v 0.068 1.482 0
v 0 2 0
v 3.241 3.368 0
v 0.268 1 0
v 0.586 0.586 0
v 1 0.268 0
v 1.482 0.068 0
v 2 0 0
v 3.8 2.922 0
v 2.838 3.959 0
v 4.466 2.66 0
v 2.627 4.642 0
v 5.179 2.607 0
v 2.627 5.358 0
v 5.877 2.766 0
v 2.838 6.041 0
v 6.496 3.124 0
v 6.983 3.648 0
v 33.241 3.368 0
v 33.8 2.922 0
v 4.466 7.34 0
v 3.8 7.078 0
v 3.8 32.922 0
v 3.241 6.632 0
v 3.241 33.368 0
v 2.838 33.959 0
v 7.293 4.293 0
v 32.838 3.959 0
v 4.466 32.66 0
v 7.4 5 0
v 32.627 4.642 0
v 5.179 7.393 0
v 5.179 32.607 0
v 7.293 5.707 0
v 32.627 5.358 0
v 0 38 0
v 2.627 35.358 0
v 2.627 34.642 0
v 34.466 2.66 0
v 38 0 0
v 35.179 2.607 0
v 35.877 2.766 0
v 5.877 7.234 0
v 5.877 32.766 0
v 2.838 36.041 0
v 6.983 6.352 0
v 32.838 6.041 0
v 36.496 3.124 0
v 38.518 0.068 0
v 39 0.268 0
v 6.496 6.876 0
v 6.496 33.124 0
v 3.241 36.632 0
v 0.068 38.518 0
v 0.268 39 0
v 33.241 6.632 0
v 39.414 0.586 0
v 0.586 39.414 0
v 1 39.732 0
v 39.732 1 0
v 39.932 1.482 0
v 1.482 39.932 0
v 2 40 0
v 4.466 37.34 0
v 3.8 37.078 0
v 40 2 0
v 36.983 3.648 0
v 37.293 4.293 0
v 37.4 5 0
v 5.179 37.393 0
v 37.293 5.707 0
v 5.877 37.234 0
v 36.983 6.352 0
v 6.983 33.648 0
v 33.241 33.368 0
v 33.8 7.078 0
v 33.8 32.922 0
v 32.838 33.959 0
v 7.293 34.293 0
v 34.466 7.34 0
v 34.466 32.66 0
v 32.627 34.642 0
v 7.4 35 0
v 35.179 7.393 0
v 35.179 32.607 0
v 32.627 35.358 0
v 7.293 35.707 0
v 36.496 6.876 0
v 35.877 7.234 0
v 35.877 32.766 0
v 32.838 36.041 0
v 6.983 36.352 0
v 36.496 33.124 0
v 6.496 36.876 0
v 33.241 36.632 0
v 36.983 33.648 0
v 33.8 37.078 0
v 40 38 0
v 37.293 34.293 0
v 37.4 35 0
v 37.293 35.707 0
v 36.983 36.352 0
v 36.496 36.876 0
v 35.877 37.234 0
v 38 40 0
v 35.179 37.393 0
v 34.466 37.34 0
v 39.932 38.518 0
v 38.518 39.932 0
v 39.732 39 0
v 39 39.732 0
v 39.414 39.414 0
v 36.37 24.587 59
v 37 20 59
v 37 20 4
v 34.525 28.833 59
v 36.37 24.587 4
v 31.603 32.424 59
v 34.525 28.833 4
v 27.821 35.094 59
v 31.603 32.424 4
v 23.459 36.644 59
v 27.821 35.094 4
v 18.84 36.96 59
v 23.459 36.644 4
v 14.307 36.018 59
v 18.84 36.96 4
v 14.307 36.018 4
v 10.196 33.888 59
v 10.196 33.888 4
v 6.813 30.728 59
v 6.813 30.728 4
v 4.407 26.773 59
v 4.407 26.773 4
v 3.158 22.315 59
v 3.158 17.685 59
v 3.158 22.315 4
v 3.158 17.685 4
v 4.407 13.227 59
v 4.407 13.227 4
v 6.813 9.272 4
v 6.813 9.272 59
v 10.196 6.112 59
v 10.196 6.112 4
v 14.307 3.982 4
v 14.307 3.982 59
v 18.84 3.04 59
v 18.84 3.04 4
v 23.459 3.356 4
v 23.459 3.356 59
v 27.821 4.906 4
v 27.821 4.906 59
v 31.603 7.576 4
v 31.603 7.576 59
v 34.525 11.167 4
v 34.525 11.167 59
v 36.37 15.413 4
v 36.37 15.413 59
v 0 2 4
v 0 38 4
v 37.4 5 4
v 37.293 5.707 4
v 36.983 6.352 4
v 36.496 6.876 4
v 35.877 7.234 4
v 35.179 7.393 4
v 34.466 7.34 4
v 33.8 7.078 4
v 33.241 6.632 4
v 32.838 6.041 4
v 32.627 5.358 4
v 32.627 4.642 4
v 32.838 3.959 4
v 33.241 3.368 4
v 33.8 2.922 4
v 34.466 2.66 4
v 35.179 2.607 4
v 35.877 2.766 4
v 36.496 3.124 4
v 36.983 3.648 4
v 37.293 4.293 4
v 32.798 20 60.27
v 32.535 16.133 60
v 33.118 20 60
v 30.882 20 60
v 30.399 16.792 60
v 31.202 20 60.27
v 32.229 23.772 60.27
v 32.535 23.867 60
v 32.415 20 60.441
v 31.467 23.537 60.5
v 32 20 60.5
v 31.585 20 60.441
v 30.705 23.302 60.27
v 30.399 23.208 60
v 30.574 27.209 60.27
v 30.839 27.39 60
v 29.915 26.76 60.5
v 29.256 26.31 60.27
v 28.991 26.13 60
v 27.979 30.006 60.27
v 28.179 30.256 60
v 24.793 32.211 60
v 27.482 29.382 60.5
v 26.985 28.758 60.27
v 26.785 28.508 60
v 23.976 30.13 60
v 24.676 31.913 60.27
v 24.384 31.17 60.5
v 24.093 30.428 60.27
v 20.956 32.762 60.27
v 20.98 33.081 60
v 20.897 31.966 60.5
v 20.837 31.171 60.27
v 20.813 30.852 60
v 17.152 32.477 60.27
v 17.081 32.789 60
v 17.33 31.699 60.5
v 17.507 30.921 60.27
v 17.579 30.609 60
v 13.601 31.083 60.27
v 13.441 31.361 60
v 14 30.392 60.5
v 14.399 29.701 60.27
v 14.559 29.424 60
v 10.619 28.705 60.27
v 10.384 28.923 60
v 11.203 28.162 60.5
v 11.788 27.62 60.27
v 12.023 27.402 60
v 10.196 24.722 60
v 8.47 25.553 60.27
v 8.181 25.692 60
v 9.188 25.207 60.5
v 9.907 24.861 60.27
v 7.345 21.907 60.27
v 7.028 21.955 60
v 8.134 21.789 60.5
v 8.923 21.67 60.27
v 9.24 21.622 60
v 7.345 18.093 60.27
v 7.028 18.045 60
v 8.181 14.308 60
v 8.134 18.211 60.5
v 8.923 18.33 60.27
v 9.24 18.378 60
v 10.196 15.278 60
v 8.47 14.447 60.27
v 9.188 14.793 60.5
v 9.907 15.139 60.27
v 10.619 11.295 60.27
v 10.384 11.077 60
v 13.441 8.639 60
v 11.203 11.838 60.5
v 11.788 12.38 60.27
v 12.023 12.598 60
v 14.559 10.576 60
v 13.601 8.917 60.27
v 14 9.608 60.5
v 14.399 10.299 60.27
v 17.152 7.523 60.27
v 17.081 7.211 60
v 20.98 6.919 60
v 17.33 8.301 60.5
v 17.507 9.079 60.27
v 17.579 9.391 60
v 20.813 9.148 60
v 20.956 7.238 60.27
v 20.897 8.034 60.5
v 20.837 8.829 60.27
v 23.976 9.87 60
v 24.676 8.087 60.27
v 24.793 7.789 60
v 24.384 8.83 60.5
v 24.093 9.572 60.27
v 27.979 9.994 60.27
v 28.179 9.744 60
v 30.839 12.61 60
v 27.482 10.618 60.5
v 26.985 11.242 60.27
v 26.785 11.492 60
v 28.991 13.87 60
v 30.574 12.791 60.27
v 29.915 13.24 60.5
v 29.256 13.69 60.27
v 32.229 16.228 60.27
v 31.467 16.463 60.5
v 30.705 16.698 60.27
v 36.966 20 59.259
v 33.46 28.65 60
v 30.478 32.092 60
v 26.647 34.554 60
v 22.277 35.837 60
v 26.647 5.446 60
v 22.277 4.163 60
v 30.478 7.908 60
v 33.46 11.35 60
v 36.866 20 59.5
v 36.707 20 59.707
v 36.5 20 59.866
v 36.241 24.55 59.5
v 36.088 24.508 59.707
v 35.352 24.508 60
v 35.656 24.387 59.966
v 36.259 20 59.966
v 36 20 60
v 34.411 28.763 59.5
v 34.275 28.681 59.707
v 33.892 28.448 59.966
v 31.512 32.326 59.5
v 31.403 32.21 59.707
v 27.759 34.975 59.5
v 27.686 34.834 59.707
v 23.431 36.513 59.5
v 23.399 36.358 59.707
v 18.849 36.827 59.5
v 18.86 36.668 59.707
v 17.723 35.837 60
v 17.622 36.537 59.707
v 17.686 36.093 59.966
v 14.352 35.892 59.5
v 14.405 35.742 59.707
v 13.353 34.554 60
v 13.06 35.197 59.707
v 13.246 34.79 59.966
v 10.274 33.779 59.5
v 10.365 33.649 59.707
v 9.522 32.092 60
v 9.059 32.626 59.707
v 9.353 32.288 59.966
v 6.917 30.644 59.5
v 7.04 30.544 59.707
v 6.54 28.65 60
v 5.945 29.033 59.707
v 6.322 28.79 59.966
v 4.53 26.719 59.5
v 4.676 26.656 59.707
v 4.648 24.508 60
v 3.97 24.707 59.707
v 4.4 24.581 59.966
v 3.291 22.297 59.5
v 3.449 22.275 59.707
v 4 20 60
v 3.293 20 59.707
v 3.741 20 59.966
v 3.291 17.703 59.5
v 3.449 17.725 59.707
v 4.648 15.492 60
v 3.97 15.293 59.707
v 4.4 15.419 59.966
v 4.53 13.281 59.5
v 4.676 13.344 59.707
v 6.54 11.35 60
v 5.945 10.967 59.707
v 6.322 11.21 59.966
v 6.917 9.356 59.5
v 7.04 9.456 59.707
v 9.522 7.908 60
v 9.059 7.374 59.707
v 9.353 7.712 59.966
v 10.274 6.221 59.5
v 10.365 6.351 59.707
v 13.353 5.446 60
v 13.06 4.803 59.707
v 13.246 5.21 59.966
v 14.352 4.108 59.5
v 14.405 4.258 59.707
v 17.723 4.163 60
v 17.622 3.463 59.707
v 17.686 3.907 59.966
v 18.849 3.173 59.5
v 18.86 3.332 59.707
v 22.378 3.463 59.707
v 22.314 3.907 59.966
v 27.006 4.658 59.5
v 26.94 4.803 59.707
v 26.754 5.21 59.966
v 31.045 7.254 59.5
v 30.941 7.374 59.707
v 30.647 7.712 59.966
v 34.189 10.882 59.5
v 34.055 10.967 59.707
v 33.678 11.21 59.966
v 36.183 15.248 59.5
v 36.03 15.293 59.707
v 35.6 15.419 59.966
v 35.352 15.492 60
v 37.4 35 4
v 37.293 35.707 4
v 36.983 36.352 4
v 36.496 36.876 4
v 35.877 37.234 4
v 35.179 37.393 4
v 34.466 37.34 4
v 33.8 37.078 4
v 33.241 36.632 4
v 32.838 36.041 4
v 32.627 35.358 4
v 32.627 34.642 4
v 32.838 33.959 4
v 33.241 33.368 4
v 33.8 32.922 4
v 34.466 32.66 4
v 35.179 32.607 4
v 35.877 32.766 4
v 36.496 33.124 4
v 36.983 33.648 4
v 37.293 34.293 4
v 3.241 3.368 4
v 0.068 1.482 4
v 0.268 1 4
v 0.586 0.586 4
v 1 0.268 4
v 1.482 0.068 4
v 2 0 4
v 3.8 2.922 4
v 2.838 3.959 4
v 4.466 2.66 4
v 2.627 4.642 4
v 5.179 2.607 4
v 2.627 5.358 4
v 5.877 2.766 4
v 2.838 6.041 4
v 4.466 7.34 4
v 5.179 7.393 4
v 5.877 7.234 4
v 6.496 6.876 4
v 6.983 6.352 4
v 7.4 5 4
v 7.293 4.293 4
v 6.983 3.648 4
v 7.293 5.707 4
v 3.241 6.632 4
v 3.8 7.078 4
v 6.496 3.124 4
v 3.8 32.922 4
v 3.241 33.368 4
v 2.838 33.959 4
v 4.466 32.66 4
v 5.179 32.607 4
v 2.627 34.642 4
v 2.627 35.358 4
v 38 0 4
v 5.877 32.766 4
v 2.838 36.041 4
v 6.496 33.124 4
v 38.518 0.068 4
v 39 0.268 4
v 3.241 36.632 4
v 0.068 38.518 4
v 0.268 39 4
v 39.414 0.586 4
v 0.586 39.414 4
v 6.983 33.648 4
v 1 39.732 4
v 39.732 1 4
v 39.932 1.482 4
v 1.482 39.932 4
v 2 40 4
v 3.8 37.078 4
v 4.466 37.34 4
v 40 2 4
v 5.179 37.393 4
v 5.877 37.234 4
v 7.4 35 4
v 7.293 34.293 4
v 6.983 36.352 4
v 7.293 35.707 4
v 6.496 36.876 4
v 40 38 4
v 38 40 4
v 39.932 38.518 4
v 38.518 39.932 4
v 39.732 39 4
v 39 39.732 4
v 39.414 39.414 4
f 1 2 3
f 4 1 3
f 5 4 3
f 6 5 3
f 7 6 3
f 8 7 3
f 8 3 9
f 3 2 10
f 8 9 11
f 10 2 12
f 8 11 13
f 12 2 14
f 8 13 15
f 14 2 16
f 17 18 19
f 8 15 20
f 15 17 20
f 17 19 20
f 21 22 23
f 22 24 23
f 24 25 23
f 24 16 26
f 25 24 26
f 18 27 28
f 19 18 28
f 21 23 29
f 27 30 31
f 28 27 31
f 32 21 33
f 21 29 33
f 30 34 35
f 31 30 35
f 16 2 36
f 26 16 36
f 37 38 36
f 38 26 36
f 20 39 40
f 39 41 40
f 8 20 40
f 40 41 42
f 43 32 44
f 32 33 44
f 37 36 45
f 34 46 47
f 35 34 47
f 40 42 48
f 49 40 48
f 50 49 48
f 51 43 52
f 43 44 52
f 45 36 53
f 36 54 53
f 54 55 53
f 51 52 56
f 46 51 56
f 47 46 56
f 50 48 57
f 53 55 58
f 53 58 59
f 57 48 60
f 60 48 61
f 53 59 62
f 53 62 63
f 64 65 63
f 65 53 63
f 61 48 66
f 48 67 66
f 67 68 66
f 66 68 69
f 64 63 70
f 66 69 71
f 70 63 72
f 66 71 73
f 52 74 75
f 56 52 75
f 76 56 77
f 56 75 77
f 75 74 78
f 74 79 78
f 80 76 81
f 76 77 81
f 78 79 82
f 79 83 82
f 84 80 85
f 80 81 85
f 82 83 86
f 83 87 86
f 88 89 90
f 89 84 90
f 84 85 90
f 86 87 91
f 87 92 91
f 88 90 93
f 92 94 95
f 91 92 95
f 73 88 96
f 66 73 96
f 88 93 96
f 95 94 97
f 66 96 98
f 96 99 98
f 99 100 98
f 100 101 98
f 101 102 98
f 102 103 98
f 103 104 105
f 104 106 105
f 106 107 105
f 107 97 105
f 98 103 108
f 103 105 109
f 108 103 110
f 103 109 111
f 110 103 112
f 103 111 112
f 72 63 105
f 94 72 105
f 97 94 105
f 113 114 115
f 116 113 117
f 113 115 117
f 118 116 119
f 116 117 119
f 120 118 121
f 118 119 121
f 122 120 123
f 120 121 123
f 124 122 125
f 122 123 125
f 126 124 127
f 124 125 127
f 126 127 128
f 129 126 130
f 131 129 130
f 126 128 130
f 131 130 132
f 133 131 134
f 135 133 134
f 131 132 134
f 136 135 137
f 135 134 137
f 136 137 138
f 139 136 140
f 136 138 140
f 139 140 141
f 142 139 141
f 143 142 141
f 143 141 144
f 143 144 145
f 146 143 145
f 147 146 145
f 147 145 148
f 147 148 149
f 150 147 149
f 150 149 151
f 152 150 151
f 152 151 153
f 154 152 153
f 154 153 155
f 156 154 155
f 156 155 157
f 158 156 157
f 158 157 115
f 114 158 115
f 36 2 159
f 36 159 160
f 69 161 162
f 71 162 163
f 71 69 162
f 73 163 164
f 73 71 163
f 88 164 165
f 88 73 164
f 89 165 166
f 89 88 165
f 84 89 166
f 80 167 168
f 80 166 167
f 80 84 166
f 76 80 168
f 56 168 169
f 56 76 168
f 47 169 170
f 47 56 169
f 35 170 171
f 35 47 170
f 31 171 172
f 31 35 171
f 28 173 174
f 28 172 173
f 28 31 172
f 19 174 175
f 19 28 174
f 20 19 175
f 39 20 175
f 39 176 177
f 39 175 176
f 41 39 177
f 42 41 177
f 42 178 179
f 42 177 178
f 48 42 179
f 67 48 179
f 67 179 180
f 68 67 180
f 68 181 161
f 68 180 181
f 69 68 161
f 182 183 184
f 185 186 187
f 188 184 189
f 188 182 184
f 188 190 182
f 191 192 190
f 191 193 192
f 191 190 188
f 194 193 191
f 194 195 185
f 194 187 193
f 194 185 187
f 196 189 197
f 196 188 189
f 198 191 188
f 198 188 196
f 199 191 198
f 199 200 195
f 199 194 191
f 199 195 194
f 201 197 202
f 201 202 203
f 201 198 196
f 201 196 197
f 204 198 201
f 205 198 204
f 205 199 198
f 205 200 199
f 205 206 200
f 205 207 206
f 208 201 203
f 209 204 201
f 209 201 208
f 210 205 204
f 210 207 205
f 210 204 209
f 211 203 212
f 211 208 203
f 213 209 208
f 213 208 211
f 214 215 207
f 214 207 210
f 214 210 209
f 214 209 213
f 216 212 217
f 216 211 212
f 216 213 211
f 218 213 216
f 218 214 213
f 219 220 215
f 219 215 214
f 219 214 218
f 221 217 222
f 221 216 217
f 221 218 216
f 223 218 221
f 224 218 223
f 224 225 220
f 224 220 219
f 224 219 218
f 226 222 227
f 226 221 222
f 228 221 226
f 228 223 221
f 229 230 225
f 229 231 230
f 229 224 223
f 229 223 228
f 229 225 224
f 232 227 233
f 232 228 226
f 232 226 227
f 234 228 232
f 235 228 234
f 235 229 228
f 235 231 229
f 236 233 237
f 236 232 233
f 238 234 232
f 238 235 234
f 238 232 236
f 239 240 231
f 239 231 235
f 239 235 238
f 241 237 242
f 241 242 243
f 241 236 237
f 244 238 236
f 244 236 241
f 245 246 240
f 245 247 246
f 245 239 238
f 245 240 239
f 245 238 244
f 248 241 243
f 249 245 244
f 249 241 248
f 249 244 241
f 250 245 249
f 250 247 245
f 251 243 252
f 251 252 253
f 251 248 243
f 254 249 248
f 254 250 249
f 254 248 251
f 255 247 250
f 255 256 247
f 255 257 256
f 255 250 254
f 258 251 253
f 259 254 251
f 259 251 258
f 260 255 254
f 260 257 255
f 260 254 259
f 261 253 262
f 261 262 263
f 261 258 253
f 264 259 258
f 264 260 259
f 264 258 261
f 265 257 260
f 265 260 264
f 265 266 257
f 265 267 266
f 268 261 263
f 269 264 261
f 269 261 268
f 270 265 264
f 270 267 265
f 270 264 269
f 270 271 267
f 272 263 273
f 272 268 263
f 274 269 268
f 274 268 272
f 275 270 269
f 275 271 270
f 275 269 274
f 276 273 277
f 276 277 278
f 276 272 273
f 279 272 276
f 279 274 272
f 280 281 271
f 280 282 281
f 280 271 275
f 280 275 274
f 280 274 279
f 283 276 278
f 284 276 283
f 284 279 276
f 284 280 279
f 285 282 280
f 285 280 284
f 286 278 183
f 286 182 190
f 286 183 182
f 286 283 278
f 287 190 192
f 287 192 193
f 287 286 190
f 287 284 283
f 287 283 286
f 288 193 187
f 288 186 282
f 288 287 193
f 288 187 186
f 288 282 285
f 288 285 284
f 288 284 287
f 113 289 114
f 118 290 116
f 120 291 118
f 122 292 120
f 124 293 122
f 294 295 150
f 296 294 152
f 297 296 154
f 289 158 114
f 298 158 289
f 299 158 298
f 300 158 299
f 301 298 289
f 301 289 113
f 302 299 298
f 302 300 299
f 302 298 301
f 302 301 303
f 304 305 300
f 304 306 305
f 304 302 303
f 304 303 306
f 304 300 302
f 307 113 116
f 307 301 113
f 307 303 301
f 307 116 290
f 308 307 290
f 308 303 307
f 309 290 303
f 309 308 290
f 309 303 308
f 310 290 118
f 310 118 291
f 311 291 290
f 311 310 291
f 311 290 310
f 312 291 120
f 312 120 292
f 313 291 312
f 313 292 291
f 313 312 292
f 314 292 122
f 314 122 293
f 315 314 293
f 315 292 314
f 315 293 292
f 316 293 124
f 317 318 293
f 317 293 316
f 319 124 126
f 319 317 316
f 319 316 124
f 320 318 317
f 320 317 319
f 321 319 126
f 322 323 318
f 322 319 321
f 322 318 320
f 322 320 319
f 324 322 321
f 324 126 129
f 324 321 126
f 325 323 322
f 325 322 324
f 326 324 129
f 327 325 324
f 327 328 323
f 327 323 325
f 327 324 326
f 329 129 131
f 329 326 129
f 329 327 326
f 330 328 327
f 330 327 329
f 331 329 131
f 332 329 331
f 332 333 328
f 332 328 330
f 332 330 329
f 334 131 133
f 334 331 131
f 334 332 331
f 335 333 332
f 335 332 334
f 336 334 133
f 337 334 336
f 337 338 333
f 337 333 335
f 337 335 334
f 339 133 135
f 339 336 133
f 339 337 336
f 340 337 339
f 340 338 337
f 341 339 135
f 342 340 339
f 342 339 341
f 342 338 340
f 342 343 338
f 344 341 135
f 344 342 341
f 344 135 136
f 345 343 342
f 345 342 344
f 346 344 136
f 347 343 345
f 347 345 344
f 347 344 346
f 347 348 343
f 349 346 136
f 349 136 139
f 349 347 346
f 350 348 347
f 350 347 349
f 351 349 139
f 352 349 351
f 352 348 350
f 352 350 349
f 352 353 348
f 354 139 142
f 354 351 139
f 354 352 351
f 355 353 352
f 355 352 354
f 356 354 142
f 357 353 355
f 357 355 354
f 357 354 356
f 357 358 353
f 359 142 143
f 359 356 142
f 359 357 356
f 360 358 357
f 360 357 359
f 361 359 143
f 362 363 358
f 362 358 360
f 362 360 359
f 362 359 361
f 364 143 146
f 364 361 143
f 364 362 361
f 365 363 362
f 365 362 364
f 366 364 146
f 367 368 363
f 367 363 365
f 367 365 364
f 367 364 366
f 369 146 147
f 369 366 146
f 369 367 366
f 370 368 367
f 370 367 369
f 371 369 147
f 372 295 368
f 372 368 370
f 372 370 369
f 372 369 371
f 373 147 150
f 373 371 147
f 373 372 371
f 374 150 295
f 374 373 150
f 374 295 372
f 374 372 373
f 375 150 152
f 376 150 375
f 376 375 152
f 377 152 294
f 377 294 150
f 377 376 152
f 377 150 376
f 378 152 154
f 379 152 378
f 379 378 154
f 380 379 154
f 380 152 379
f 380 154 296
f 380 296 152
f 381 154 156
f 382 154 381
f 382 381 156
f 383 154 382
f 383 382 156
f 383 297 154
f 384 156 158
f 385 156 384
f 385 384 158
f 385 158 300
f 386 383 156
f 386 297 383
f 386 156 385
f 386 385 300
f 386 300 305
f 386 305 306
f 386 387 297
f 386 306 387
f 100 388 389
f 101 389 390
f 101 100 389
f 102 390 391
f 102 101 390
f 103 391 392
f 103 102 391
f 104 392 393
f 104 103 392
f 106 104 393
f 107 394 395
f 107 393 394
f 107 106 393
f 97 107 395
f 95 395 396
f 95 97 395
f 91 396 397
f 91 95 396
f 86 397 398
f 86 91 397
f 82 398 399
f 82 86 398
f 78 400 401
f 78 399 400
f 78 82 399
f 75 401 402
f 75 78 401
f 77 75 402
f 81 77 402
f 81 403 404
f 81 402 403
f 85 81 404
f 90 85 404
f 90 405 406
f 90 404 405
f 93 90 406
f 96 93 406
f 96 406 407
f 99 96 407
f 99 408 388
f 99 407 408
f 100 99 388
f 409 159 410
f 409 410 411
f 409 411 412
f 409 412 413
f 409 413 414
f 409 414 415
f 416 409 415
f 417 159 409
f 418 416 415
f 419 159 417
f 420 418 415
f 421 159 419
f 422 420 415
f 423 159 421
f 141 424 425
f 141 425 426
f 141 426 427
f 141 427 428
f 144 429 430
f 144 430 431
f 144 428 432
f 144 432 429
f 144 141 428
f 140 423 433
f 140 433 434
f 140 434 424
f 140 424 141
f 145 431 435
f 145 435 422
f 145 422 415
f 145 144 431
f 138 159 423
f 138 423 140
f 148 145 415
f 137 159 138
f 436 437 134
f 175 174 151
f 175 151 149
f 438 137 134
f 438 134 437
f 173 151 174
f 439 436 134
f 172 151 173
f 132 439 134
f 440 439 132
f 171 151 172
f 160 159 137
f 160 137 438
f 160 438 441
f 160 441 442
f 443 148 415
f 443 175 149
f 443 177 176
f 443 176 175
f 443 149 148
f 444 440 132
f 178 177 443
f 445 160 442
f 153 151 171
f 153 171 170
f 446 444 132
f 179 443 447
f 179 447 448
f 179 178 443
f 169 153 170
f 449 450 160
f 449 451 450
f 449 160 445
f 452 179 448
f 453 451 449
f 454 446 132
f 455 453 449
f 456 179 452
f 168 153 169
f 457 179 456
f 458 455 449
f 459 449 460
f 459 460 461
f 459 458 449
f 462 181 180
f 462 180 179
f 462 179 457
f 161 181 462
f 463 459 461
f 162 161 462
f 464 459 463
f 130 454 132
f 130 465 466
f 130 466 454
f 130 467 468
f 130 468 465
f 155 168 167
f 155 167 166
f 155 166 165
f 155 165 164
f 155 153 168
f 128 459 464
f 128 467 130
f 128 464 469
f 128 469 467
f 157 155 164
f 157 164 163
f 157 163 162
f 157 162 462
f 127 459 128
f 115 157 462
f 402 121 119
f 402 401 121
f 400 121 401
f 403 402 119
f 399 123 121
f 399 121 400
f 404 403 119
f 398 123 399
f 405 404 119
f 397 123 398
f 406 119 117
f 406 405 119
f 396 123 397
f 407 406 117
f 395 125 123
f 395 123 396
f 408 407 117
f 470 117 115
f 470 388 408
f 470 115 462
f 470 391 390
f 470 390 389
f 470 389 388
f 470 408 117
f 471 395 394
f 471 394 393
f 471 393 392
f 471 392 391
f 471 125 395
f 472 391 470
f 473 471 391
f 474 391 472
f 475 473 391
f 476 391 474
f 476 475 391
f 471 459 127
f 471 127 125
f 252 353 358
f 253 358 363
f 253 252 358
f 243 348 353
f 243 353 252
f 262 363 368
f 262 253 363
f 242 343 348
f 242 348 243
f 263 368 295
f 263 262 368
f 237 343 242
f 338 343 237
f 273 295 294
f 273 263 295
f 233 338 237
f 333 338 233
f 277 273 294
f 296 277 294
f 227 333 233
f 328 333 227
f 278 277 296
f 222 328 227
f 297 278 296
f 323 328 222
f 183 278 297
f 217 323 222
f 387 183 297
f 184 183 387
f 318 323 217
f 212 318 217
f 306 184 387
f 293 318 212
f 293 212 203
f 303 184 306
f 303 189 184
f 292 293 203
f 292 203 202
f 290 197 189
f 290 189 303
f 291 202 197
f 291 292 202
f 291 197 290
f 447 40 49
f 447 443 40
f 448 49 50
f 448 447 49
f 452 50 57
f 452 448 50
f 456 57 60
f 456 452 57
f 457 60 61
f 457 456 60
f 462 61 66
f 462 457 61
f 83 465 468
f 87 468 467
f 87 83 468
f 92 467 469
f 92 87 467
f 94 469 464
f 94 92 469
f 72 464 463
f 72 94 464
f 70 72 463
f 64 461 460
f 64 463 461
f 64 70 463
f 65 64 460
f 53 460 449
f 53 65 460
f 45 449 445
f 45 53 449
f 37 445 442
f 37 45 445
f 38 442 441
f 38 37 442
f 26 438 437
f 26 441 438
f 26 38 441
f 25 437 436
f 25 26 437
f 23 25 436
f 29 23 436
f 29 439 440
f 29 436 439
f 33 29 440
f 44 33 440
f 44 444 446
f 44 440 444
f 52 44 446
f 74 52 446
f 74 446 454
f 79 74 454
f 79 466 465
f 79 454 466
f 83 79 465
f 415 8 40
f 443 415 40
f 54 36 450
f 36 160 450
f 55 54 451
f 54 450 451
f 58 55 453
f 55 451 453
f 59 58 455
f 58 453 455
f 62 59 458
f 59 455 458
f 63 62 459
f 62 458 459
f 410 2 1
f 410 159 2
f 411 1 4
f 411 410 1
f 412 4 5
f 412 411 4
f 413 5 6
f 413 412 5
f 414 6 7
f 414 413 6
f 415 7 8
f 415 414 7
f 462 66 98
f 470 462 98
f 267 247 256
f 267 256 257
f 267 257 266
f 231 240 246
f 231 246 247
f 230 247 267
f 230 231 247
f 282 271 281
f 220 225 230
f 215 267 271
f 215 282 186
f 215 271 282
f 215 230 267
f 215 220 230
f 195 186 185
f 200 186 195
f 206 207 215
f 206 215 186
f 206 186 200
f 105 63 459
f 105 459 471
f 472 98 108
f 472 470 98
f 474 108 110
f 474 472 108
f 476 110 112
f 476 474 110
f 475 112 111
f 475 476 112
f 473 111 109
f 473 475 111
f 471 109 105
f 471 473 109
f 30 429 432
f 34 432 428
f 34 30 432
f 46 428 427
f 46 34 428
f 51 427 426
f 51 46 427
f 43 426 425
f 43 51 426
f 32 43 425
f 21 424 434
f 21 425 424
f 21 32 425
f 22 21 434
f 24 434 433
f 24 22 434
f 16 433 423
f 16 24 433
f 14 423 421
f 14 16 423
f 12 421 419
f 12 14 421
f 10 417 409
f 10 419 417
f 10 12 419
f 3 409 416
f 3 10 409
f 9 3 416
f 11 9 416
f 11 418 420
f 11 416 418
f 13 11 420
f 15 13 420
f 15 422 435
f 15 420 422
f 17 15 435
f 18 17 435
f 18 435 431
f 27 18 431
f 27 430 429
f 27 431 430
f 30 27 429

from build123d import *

# Parameters (mm, degrees)
CYLINDER004_R     = 17
CYLINDER004_DEPTH = 60
FILLET001_R       = 1
TORUS_R           = 1.5
CYLINDER_R        = 2.4
CYLINDER_DEPTH    = 10
CYLINDER001_R     = 2.4
CYLINDER001_DEPTH = 10
CYLINDER002_R     = 2.4
CYLINDER002_DEPTH = 10
CYLINDER003_R     = 2.4
CYLINDER003_DEPTH = 10
BOX_W             = 40
BOX_H             = 40
BOX_DEPTH         = 4
FILLET_R          = 2
FILLET002_R       = 1


with BuildPart() as cylinder004:
    # Cylinder004 → Cylinder004 (new body)
    with BuildSketch(Plane(origin=(20, 20, 0), x_dir=(1, 0, 0), z_dir=(0, 0, 1))):
        Circle(CYLINDER004_R)
    extrude(amount=CYLINDER004_DEPTH)


with BuildPart() as fillet001:
    # Fillet001 base: copy of Cylinder004
    add(cylinder004.part)

    # Fillet001
    fillet001_edges = [fillet001.edges().sort_by_distance(p)[0] for p in [
        (3, 20, 60),
    ]]
    fillet(fillet001_edges, radius=FILLET001_R)


with BuildPart() as cut001:
    # Torus → Torus (revolve)
    with BuildSketch(Plane(origin=(20, 20, 59), x_dir=(1, 0, 0), z_dir=(0, -1, 0))):
        with Locations((12, 0)):
            Circle(TORUS_R)
    revolve(axis=Axis((20, 20, 59), (0, 0, 1)))

    # Cut001: cut Fillet001
    add(fillet001.part, mode=Mode.SUBTRACT)


with BuildPart() as cylinder:
    # Cylinder → Cylinder (new body)
    with BuildSketch(Plane(origin=(5, 5, 0), x_dir=(1, 0, 0), z_dir=(0, 0, 1))):
        Circle(CYLINDER_R)
    extrude(amount=CYLINDER_DEPTH)


with BuildPart() as fusion:
    # Cylinder001 → Cylinder001 (new body)
    with BuildSketch(Plane(origin=(5, 35, 0), x_dir=(1, 0, 0), z_dir=(0, 0, 1))):
        Circle(CYLINDER001_R)
    extrude(amount=CYLINDER001_DEPTH)

    # Fusion: union Cylinder
    add(cylinder.part)


with BuildPart() as cylinder002:
    # Cylinder002 → Cylinder002 (new body)
    with BuildSketch(Plane(origin=(5, 5, 0), x_dir=(1, 0, 0), z_dir=(0, 0, 1))):
        Circle(CYLINDER002_R)
    extrude(amount=CYLINDER002_DEPTH)


with BuildPart() as fusion002:
    # Cylinder003 → Cylinder003 (new body)
    with BuildSketch(Plane(origin=(5, 35, 0), x_dir=(1, 0, 0), z_dir=(0, 0, 1))):
        Circle(CYLINDER003_R)
    extrude(amount=CYLINDER003_DEPTH)

    # Fusion001: union Cylinder002
    add(cylinder002.part)


with BuildPart() as fusion002_1:
    # Fusion001 placement: moved
    add(fusion002.part.moved(Location((30, 0, 0))))

    # Fusion002: union Fusion
    add(fusion.part)


with BuildPart() as cut:
    # Box → Box (new body)
    with BuildSketch(Plane.XY):
        with Locations((20, 20)):
            Rectangle(BOX_W, BOX_H)
    extrude(amount=BOX_DEPTH)

    # Fillet
    fillet_edges = [cut.edges().sort_by_distance(p)[0] for p in [
        (0, 0, 2),
        (0, 40, 2),
        (40, 0, 2),
        (40, 40, 2),
    ]]
    fillet(fillet_edges, radius=FILLET_R)

    # Cut: cut Fusion002
    add(fusion002_1.part, mode=Mode.SUBTRACT)


with BuildPart() as fusion003:
    # Fillet002 base: copy of Cylinder004
    add(cylinder004.part)

    # Fillet002
    fillet002_edges = [fusion003.edges().sort_by_distance(p)[0] for p in [
        (3, 20, 60),
    ]]
    fillet(fillet002_edges, radius=FILLET002_R)

    # Fusion003: union Cut001, Cut
    add(cut001.part)
    add(cut.part)


solid = fusion003.part
